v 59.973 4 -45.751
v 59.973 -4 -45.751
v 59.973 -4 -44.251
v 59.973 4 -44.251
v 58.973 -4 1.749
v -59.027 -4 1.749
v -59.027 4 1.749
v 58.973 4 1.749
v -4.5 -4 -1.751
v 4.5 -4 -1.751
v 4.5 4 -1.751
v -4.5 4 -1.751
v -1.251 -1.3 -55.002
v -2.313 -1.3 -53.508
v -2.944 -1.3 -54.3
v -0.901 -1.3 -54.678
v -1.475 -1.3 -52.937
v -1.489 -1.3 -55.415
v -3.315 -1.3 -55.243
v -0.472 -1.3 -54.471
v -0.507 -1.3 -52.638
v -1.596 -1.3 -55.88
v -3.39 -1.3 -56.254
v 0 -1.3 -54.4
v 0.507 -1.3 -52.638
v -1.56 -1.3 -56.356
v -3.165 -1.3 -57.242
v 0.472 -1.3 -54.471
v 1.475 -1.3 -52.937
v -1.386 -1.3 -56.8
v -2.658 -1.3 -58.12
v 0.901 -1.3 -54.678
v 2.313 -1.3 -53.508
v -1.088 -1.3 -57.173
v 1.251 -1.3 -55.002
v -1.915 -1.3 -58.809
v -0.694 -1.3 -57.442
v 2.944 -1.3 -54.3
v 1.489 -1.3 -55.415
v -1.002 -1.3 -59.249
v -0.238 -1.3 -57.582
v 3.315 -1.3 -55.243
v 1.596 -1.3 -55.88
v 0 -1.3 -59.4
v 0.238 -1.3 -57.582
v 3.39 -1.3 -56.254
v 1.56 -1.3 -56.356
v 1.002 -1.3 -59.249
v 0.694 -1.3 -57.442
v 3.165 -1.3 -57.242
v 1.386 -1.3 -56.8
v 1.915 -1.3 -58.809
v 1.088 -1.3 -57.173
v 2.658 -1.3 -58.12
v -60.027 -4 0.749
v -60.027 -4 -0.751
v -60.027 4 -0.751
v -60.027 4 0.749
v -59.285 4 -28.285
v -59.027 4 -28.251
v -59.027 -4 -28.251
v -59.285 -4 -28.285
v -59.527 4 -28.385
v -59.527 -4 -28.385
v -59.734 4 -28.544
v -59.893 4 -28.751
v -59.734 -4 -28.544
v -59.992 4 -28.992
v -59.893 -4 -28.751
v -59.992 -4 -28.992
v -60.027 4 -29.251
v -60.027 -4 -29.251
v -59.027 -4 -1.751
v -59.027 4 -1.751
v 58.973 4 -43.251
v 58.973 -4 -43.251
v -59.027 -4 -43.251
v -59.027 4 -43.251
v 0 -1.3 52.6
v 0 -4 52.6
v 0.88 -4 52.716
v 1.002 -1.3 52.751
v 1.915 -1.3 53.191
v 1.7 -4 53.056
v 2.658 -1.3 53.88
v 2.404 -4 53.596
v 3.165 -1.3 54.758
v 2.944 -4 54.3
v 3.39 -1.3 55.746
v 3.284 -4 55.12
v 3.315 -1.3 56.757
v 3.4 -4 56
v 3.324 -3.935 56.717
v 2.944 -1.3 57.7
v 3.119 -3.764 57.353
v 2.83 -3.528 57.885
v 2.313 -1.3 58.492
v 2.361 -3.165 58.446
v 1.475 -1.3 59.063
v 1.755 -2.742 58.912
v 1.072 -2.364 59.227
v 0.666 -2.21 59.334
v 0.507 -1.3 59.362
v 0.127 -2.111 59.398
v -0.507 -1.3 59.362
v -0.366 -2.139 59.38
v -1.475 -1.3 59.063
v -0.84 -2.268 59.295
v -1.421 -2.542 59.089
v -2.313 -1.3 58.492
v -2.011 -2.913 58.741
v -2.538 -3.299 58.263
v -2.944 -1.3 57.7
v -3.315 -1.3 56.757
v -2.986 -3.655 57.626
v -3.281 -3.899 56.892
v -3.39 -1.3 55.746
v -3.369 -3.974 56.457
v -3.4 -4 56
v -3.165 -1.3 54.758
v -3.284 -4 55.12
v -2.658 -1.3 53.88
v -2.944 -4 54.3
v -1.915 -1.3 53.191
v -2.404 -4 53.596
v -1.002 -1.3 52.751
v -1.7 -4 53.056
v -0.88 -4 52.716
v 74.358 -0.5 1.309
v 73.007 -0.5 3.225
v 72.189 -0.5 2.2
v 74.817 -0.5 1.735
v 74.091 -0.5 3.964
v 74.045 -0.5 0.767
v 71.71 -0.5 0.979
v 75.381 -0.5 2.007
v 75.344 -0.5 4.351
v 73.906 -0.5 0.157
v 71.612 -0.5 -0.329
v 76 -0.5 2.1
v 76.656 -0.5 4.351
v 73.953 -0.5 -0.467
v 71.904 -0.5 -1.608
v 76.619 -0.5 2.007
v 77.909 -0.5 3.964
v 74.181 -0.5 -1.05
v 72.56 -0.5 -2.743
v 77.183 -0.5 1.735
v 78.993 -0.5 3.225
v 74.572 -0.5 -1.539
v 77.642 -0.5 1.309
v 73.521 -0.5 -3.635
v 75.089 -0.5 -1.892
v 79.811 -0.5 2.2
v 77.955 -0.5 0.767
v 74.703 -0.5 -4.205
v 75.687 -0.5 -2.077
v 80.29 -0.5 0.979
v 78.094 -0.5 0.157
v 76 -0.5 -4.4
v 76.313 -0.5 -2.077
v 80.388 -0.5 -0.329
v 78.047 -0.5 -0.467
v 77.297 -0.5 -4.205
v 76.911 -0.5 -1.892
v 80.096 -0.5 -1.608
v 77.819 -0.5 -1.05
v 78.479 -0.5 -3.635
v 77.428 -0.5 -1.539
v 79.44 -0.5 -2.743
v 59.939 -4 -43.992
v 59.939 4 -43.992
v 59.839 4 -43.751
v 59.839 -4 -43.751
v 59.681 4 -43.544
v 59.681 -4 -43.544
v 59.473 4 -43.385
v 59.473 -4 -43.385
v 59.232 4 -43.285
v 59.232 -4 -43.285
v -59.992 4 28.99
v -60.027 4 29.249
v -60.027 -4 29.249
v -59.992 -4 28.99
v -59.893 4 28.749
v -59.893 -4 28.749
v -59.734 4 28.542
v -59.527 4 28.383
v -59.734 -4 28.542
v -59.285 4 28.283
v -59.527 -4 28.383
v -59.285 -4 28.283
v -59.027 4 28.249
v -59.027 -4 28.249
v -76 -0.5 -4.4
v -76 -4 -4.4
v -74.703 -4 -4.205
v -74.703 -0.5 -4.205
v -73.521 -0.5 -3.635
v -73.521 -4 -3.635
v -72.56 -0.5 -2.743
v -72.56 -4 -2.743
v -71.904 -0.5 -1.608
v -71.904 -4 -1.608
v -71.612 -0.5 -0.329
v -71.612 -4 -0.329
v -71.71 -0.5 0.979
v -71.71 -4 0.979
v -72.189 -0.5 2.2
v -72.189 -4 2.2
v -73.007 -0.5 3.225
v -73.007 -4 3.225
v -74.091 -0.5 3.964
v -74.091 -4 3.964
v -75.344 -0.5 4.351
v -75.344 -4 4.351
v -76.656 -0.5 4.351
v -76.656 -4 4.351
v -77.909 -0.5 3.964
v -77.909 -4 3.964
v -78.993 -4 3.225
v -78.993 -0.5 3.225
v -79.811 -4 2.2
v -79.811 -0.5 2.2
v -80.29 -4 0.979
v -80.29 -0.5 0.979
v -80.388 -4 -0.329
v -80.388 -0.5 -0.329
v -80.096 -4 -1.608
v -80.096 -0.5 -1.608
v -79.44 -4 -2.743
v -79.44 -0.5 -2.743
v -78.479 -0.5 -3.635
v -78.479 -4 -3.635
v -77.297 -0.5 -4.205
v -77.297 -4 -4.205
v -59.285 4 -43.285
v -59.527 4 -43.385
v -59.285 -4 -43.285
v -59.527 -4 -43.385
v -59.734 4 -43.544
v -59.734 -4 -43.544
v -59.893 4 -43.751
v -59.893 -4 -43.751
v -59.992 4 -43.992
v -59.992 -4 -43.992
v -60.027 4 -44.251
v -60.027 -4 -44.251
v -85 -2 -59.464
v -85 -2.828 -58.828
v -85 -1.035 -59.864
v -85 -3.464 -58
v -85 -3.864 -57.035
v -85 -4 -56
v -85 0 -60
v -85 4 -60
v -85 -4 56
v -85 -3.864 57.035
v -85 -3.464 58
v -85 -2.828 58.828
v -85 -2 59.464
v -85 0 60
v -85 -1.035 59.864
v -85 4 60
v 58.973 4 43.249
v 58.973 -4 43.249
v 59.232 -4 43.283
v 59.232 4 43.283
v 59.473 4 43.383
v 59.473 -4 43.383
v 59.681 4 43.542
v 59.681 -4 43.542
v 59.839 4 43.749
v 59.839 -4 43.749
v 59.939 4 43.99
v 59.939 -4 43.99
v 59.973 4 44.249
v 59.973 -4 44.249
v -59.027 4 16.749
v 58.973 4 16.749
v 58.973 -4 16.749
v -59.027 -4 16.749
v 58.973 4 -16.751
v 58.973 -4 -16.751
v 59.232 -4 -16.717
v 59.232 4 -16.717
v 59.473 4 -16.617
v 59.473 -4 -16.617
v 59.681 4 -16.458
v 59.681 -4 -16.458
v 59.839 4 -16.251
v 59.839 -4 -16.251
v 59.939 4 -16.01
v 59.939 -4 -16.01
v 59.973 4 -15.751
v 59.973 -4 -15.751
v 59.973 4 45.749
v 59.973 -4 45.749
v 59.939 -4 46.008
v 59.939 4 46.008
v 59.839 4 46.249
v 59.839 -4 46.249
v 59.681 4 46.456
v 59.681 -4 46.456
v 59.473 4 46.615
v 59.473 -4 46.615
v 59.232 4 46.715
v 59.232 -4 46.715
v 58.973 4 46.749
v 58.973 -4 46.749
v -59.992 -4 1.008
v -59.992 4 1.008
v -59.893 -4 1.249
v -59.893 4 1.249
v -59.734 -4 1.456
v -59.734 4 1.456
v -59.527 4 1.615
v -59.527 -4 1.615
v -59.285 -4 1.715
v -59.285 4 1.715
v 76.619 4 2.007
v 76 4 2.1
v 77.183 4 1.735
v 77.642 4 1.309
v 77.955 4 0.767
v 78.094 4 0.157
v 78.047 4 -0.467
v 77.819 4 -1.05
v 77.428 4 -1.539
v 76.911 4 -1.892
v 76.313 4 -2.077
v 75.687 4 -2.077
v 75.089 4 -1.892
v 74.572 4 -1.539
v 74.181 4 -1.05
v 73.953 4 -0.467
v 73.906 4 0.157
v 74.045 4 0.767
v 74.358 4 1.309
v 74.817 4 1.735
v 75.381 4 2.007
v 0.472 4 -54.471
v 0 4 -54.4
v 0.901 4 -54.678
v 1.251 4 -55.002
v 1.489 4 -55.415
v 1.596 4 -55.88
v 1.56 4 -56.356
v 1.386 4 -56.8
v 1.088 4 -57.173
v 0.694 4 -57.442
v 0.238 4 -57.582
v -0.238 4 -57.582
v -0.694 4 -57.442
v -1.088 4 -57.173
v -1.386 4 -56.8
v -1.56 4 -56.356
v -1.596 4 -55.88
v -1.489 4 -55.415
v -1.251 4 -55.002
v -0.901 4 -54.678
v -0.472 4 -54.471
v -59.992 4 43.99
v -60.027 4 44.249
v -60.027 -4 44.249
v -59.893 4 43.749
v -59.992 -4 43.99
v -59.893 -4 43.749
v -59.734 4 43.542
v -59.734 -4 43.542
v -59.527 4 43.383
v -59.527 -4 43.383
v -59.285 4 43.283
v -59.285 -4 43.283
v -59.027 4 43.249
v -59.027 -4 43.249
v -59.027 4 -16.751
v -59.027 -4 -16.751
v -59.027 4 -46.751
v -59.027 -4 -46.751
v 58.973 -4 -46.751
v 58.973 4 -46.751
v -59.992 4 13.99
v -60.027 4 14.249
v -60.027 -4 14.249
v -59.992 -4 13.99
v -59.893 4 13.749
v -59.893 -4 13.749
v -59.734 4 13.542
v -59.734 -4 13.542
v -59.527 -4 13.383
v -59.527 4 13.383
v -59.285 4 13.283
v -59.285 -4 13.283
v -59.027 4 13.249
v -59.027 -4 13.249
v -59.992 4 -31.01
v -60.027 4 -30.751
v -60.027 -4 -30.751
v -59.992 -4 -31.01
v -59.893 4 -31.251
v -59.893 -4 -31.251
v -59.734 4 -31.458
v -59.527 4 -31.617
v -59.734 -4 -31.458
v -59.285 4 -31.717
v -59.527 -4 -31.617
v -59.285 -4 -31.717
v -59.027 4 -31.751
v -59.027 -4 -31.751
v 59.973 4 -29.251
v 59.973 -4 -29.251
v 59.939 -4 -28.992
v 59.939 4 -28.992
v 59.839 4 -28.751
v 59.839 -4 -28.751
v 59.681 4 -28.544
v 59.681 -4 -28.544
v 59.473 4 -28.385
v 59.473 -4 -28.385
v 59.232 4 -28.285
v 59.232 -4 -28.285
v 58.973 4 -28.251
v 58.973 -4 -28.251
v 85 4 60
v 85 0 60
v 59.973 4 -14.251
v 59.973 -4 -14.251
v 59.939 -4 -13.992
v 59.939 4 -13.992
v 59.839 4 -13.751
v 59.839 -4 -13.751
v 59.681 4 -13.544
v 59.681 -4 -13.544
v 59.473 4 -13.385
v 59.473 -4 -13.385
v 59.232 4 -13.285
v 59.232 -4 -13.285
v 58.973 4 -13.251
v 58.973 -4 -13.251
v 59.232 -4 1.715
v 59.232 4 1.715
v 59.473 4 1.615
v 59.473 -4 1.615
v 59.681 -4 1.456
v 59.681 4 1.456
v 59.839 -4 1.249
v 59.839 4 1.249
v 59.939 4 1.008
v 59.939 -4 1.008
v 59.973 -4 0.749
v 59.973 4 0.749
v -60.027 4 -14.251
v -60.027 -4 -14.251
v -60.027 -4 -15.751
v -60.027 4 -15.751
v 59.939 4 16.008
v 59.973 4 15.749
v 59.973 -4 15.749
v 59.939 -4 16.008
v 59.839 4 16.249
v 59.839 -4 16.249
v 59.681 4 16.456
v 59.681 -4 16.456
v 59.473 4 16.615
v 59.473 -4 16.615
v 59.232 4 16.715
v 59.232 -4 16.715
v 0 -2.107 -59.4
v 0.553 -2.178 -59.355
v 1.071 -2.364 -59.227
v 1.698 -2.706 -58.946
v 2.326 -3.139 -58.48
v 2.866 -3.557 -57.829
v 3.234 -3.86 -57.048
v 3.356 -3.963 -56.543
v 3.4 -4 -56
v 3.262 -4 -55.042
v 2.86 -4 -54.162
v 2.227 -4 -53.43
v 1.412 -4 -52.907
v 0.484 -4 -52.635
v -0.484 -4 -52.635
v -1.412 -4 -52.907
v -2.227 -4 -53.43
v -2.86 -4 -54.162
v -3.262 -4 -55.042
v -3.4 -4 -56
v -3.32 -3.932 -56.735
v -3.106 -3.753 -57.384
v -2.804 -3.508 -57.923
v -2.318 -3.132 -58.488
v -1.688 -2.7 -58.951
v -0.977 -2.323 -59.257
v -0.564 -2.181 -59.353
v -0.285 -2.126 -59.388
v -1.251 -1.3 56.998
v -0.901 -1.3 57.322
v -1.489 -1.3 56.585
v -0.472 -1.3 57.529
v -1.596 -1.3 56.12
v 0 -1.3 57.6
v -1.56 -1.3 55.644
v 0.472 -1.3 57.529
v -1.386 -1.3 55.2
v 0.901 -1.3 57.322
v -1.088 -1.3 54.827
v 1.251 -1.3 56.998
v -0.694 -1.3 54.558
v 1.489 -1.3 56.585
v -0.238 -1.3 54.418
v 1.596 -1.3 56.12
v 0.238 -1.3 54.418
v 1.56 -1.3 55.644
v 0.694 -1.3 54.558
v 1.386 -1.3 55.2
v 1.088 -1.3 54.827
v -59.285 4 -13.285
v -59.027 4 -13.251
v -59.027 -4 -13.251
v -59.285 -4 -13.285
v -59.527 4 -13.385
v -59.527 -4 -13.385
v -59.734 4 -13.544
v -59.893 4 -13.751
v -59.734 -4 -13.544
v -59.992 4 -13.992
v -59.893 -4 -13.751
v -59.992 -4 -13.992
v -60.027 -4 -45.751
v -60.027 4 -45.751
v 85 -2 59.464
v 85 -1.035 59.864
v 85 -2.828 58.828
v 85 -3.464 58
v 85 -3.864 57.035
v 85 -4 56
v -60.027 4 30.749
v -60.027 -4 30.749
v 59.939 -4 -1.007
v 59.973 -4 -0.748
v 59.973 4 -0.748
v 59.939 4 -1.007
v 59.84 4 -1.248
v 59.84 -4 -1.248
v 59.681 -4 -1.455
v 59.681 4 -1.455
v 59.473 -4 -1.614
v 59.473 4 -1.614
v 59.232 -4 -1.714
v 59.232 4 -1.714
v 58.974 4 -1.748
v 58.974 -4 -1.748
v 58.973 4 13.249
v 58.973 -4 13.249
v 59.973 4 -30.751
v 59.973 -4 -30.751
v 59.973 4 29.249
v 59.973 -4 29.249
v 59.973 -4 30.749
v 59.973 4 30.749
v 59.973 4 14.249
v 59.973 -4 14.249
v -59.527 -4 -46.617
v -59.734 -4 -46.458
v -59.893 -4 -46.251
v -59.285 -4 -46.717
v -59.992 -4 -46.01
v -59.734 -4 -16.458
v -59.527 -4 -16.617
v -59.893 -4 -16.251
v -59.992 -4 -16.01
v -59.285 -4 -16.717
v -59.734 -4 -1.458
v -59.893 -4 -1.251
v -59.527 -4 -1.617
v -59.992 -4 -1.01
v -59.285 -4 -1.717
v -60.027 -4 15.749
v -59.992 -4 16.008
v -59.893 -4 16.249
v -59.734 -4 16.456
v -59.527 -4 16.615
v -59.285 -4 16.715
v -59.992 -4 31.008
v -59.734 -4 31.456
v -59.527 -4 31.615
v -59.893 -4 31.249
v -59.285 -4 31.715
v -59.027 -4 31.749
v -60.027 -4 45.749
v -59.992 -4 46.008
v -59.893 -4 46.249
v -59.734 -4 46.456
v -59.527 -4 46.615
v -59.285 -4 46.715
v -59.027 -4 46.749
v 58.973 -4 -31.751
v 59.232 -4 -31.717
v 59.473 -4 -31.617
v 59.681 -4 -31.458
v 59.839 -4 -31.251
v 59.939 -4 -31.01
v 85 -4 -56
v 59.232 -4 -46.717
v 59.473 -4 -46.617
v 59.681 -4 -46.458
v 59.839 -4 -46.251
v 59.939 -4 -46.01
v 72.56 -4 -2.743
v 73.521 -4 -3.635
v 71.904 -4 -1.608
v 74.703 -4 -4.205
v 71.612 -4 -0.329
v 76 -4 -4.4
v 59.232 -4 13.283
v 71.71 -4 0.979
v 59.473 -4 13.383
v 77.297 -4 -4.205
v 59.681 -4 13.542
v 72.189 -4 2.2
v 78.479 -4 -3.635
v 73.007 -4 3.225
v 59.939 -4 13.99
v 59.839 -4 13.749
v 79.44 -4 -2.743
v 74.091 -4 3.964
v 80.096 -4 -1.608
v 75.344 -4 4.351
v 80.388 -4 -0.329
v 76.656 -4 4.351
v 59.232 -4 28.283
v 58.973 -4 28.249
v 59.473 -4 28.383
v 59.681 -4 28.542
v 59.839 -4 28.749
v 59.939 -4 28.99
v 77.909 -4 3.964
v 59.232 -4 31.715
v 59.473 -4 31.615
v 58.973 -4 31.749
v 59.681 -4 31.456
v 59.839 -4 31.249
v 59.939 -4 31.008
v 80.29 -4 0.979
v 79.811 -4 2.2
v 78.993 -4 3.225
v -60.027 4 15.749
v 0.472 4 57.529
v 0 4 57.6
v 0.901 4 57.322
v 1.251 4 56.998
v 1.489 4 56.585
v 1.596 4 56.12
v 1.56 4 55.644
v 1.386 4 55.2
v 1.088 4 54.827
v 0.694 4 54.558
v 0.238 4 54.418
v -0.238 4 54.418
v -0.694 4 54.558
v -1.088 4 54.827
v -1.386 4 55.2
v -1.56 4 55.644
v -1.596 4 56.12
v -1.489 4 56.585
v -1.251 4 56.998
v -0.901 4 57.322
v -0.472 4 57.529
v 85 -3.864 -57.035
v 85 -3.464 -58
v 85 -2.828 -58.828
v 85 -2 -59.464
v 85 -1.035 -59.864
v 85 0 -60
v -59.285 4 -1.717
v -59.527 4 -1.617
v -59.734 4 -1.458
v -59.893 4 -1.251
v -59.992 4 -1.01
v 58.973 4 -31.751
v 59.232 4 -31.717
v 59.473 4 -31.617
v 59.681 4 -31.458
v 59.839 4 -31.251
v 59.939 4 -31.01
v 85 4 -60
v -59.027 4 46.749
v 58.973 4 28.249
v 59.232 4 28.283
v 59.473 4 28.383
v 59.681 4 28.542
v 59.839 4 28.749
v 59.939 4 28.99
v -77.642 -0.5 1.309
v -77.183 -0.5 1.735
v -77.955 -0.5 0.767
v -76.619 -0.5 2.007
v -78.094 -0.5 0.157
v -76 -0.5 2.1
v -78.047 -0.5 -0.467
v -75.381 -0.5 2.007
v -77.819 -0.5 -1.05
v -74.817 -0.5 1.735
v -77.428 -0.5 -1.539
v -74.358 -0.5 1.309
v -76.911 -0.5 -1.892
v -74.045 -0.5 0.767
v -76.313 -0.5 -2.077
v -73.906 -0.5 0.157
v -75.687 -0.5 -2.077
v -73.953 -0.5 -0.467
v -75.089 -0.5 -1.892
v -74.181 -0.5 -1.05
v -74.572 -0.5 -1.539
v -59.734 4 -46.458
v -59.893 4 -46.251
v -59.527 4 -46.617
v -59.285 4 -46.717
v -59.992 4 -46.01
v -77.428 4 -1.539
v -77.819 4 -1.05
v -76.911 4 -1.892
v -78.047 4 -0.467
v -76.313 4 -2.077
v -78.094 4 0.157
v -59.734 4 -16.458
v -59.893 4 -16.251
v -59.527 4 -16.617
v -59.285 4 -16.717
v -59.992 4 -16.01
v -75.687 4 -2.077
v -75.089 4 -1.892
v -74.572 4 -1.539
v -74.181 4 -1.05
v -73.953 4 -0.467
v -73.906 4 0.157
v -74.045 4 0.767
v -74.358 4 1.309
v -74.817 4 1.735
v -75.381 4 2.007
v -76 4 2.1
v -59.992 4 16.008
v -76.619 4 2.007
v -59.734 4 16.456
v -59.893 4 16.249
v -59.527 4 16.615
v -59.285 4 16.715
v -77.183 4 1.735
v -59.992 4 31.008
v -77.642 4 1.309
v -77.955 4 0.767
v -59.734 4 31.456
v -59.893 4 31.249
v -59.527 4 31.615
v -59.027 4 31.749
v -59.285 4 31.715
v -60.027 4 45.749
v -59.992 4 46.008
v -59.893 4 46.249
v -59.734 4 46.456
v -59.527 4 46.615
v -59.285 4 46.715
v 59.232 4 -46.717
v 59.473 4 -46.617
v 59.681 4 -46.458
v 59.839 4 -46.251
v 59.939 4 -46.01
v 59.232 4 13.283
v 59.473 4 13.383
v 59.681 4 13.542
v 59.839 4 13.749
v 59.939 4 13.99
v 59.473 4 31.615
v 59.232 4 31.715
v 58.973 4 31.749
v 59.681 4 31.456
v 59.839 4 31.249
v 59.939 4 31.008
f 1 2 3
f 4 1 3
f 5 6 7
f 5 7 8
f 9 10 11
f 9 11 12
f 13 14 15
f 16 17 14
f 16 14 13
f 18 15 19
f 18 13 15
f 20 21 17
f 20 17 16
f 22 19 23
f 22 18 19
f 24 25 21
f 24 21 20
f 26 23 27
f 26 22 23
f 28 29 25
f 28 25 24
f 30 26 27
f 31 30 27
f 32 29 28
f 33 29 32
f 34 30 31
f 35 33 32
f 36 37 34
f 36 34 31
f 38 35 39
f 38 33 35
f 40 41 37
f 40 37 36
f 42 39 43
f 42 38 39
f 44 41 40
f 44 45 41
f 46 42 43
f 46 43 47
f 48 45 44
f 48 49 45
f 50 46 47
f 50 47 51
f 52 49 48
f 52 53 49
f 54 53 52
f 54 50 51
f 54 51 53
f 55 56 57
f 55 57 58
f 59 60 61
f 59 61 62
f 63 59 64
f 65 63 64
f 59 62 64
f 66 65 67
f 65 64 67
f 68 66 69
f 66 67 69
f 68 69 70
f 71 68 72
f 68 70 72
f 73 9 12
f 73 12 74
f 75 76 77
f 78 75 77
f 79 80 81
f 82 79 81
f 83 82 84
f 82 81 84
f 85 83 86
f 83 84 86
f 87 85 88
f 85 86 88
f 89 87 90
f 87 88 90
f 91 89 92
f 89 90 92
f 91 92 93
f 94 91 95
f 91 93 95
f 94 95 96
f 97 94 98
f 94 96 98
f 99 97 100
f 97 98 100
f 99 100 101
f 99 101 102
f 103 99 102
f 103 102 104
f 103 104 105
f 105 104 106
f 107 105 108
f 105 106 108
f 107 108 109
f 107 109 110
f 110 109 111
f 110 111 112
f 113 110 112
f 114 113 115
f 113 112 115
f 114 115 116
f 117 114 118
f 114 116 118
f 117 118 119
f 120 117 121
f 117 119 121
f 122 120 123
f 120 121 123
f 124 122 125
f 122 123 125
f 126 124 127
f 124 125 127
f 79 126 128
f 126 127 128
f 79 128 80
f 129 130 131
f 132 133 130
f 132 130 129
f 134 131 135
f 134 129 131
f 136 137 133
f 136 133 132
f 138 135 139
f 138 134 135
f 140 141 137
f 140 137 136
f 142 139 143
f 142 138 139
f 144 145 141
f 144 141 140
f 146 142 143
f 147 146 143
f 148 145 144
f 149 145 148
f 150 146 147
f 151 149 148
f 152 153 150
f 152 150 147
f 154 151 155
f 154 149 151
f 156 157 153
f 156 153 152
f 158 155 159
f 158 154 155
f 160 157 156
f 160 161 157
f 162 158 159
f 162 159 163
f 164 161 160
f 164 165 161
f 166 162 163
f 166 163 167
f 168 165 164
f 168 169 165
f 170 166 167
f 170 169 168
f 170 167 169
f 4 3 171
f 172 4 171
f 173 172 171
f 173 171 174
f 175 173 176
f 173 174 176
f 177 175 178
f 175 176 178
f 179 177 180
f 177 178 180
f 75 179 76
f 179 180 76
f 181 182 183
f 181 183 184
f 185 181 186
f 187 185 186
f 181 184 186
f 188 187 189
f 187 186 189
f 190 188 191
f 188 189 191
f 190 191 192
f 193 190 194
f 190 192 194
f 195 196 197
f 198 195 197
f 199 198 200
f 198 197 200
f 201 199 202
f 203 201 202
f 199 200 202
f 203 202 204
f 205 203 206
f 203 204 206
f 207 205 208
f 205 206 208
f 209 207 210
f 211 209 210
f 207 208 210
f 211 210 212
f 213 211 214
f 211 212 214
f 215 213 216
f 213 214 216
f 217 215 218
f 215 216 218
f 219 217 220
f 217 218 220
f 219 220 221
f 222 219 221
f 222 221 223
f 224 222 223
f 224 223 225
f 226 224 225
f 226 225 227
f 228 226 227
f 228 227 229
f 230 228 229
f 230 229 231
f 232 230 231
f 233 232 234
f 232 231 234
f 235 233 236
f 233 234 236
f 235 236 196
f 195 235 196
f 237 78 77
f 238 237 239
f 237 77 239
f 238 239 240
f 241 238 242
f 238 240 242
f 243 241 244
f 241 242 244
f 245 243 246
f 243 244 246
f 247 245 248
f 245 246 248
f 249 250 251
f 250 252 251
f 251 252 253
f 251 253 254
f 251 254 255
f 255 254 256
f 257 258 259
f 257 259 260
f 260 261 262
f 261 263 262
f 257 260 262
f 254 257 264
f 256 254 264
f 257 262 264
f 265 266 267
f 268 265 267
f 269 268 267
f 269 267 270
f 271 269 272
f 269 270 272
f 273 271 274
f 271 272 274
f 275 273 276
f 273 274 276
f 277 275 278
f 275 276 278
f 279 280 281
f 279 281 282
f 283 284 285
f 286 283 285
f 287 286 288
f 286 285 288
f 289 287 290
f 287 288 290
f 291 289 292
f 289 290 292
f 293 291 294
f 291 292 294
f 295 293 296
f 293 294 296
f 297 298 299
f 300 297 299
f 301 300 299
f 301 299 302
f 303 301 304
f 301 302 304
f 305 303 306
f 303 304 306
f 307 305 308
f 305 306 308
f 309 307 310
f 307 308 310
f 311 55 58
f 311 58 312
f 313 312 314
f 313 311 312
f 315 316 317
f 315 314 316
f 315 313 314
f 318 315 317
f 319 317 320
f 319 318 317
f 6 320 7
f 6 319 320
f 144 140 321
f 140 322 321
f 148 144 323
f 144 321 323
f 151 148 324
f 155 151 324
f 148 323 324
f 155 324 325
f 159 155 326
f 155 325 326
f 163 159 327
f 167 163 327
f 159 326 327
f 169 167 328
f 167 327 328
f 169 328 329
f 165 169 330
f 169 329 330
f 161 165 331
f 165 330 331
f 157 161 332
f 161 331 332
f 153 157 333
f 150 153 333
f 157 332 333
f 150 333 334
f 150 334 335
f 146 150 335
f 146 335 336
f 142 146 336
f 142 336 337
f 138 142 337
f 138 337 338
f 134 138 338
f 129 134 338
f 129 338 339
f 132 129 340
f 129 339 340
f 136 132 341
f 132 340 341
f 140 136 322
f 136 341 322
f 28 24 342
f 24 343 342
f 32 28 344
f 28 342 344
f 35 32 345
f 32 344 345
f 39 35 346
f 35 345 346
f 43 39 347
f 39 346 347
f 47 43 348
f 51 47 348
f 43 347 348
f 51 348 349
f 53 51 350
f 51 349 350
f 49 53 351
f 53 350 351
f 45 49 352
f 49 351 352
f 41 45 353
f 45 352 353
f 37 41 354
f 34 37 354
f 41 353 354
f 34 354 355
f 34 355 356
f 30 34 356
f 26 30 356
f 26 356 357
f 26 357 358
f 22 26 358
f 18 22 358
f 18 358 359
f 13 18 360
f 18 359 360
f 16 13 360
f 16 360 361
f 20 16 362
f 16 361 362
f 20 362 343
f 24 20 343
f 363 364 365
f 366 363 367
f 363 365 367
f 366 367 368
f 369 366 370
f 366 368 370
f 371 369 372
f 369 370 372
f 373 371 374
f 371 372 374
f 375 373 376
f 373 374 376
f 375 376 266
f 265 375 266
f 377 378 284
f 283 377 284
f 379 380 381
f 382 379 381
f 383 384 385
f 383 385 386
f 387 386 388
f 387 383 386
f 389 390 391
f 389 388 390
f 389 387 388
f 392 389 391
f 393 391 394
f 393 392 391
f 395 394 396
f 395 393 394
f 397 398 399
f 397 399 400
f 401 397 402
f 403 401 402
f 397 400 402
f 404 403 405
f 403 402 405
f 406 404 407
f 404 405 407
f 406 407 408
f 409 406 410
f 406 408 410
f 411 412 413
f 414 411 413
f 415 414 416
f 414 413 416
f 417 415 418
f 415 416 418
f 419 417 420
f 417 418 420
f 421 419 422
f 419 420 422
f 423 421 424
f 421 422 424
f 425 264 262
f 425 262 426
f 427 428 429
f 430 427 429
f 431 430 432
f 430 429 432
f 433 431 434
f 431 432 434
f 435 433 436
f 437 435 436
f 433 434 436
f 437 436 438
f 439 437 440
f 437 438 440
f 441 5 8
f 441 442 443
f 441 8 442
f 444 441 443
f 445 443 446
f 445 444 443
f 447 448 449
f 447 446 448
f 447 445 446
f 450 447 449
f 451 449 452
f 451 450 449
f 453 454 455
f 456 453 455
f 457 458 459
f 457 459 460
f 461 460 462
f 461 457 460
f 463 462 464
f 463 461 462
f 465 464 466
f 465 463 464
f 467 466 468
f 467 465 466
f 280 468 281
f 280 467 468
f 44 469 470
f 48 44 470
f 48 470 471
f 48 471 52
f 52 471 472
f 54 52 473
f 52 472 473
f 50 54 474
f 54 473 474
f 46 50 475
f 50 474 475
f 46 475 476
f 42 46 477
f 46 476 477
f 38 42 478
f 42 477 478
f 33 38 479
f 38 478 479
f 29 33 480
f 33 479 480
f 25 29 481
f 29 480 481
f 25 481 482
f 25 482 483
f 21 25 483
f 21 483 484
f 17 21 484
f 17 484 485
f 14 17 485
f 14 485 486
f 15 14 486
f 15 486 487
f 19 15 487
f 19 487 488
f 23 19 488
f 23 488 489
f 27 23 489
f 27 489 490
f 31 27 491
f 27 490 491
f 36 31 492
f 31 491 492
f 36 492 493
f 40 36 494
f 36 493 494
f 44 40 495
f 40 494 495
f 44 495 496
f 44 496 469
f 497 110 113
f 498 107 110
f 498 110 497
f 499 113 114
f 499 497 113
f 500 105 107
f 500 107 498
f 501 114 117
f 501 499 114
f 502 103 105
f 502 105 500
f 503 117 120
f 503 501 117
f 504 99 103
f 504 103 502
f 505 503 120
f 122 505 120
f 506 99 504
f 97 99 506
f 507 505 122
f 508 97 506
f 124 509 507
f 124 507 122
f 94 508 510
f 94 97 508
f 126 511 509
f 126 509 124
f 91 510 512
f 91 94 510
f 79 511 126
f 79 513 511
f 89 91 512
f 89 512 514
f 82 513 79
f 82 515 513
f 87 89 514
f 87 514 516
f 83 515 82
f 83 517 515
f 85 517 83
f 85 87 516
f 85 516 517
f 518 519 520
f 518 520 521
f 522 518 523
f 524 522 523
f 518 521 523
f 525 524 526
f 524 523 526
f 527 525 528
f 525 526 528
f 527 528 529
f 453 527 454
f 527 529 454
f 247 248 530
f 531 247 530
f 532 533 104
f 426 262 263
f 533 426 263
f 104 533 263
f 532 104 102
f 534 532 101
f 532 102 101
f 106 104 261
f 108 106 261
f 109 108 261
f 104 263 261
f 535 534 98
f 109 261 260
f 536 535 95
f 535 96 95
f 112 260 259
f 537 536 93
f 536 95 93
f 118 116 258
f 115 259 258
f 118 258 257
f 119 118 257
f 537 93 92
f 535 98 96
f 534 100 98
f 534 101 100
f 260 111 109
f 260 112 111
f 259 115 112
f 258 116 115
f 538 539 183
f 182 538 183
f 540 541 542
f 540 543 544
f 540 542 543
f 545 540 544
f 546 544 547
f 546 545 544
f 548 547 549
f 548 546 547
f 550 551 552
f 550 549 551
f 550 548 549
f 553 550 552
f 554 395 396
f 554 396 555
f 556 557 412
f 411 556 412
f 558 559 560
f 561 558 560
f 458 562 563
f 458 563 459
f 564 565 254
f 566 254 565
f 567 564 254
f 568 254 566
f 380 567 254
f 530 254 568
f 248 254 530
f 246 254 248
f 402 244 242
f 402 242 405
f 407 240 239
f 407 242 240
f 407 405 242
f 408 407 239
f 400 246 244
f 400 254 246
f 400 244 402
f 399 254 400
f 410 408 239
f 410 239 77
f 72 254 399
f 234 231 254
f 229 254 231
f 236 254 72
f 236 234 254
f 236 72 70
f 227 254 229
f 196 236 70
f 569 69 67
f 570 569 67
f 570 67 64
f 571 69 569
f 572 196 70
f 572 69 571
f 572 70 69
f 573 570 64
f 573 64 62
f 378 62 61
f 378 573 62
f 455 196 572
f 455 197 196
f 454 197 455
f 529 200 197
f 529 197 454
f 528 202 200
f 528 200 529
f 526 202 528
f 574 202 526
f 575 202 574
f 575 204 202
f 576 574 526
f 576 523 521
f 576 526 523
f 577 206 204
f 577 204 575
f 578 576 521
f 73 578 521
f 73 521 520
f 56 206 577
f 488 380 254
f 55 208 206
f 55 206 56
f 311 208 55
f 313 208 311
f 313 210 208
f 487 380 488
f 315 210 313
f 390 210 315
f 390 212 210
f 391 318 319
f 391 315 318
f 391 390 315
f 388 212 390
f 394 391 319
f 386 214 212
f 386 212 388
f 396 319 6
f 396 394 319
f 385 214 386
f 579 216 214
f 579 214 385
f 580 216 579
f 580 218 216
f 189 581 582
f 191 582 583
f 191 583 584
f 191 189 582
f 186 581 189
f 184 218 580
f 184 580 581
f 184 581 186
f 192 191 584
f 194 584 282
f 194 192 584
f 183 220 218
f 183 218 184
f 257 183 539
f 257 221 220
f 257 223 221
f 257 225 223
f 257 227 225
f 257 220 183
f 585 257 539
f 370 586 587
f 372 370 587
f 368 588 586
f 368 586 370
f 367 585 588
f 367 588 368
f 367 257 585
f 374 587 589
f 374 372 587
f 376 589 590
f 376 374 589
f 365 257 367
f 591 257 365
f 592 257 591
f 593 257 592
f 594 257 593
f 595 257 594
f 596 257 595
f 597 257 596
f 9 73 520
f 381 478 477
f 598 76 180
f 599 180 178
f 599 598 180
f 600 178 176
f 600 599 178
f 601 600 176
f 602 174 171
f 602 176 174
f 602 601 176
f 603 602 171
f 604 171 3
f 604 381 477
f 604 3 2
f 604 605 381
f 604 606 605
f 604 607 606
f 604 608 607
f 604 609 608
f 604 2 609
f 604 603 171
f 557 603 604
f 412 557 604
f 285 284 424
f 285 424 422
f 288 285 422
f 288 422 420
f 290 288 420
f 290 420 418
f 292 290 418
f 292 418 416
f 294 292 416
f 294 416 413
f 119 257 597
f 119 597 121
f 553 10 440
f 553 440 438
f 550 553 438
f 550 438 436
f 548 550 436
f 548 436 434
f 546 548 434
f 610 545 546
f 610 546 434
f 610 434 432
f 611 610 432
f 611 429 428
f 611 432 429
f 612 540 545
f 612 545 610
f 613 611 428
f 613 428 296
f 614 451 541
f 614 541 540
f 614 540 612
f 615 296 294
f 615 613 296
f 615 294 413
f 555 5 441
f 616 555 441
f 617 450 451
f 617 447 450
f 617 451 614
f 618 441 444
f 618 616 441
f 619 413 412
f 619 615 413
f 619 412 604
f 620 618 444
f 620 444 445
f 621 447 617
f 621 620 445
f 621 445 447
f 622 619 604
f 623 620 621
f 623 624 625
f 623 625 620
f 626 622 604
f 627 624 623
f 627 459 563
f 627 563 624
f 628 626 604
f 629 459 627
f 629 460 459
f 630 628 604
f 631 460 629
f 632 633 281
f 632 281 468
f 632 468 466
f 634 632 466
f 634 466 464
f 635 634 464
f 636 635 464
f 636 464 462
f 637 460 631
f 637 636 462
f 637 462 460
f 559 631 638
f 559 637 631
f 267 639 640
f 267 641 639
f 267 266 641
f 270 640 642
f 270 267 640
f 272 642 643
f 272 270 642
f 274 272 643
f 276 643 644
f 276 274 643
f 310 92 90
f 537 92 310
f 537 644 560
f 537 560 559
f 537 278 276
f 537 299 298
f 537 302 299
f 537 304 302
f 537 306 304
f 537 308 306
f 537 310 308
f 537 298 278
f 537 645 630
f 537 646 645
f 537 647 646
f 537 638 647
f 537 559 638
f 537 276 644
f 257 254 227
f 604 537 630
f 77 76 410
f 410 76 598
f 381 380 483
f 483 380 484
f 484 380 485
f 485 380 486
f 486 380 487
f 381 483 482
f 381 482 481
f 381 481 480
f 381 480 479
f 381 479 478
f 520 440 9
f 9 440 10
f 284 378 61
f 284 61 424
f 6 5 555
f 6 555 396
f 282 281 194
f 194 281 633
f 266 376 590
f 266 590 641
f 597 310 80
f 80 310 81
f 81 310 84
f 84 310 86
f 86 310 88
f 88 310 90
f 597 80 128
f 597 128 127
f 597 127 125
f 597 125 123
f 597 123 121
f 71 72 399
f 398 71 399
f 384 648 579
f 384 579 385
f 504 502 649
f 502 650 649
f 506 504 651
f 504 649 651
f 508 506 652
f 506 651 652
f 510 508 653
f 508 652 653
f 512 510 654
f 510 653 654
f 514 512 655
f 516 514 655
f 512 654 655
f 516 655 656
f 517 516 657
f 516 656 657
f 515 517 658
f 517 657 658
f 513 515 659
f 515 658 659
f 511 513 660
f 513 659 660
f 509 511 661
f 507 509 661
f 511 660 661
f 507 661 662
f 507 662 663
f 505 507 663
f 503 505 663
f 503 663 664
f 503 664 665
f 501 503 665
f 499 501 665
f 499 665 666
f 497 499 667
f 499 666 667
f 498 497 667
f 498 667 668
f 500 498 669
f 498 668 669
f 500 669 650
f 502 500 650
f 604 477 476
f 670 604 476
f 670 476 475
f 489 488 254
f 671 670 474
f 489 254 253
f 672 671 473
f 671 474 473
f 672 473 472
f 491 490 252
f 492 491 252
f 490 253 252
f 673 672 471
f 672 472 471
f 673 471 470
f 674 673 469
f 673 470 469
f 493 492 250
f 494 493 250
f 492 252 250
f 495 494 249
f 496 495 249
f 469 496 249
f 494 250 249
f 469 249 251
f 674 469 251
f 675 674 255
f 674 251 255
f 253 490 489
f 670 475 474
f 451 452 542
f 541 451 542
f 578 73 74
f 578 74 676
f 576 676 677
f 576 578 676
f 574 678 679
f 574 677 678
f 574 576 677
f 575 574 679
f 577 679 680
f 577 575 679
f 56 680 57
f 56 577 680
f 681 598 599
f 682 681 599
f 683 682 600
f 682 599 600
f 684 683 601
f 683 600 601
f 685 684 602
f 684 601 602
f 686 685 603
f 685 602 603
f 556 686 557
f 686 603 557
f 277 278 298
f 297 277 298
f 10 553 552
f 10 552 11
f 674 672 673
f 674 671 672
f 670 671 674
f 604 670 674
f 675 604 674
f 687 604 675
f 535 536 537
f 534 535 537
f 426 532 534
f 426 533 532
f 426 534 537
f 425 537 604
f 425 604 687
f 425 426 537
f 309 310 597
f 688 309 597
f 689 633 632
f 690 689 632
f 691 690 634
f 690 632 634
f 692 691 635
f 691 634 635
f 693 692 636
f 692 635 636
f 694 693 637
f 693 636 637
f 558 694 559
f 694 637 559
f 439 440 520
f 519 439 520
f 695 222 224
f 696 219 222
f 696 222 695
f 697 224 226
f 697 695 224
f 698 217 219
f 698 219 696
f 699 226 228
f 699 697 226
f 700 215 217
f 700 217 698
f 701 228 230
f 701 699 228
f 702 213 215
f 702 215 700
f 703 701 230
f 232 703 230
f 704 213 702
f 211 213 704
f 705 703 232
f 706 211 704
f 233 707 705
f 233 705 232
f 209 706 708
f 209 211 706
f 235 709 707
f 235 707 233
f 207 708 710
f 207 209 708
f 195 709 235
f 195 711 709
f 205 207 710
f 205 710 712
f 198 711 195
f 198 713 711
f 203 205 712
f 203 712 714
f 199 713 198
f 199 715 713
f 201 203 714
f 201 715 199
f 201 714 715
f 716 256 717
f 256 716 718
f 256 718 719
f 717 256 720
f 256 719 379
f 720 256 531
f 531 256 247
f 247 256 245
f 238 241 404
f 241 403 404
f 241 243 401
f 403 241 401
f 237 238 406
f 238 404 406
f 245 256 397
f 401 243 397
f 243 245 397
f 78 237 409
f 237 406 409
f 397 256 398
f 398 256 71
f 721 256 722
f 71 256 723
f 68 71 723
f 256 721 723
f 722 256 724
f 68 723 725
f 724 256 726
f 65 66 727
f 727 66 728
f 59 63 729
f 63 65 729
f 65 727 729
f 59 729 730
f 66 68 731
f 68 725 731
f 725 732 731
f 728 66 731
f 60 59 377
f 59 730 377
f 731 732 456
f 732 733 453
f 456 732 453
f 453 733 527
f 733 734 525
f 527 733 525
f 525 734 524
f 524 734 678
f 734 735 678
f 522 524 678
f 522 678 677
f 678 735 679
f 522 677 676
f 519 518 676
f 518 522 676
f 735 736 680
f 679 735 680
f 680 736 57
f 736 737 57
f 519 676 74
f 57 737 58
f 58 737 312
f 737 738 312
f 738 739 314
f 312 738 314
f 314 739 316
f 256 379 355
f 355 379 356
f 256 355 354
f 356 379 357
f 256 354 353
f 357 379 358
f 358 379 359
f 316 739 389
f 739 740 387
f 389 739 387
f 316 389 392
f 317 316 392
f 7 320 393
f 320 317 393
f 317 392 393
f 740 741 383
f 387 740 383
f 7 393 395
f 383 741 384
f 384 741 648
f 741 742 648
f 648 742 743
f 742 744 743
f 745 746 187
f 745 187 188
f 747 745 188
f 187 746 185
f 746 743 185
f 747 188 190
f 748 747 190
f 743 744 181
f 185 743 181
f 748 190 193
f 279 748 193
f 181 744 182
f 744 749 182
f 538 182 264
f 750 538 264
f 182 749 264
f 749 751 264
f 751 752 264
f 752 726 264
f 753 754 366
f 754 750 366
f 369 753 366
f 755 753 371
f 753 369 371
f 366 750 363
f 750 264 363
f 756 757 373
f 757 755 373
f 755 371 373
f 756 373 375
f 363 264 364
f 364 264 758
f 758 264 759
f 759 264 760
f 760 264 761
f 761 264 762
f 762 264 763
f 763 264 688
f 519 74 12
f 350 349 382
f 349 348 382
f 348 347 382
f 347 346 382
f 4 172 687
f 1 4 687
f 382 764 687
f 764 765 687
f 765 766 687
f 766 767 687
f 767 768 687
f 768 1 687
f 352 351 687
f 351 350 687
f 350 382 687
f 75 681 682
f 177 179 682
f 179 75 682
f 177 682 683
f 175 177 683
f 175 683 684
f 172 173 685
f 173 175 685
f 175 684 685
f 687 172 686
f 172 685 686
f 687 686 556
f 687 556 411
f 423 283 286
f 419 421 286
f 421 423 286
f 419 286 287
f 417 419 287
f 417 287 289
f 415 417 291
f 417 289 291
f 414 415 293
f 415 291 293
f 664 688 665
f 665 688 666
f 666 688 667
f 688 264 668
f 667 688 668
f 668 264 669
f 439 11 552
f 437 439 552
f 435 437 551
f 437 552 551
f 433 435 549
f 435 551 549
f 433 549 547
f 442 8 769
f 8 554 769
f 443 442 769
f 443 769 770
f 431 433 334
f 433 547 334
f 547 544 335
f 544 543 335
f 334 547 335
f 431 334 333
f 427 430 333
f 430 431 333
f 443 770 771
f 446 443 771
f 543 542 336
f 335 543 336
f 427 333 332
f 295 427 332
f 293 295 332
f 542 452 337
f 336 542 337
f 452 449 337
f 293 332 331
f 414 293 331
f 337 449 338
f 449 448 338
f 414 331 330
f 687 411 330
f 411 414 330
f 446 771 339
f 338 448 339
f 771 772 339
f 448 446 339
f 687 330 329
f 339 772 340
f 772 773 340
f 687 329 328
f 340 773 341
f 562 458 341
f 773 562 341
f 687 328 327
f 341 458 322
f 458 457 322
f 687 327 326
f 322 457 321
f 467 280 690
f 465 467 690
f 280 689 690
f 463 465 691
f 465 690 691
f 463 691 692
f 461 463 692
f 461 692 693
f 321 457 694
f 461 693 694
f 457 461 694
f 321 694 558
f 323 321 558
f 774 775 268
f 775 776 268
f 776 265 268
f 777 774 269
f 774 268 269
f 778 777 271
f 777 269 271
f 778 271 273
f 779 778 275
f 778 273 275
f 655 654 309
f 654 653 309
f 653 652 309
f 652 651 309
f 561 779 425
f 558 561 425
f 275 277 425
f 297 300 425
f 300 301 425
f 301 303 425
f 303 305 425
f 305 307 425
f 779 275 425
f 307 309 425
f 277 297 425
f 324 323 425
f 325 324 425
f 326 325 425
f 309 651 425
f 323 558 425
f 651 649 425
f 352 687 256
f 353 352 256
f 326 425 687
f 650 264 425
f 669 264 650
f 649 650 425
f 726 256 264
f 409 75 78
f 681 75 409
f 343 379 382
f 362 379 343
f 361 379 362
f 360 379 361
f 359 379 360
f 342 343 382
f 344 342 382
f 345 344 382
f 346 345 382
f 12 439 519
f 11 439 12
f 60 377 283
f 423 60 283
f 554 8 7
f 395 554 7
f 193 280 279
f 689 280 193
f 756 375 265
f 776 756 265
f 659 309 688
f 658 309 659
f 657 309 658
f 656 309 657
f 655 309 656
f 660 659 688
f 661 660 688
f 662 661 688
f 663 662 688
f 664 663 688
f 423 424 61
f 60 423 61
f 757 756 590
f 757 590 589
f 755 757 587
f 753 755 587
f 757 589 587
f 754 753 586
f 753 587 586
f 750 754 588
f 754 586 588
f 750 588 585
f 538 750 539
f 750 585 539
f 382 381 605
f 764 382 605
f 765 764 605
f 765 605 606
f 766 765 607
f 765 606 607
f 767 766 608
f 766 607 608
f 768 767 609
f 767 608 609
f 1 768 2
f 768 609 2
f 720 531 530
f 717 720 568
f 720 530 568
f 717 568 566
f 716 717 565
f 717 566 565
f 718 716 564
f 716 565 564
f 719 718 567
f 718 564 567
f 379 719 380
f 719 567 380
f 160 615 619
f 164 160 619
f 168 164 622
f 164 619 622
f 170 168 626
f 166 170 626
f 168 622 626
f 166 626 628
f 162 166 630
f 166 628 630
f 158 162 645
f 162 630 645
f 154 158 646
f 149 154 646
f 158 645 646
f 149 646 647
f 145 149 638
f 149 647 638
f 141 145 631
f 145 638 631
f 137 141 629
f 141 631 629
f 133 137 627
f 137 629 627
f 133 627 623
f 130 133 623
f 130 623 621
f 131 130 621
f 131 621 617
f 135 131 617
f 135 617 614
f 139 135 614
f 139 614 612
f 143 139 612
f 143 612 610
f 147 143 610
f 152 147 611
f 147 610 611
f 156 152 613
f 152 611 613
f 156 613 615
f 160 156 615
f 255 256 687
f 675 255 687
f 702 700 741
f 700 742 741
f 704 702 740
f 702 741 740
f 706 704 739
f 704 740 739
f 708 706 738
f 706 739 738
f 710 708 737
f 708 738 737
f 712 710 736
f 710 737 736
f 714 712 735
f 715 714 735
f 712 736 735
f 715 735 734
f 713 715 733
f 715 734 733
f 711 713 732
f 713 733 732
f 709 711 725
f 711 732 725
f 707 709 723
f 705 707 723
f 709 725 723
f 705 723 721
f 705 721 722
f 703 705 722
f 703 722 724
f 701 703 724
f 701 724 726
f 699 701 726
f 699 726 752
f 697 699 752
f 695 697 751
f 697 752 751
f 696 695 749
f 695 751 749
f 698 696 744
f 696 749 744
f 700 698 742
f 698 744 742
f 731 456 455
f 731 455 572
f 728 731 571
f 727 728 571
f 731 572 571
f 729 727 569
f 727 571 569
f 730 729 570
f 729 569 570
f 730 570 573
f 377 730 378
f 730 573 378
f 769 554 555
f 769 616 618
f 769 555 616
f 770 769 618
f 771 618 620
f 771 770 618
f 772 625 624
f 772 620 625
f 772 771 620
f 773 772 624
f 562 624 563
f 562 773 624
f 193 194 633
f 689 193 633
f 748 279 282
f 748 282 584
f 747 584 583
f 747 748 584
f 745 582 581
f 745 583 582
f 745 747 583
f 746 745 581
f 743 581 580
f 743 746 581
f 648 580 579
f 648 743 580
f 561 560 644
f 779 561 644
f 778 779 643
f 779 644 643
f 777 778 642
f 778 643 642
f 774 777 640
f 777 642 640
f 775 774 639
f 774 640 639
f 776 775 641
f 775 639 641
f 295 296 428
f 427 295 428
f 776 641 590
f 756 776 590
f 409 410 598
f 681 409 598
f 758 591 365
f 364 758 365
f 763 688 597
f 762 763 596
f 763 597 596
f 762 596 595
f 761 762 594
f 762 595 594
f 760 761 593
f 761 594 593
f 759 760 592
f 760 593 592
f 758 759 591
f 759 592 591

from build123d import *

# Parameters (mm, degrees)
IZIM1_W                     = 170
IZIM1_H                     = 8
Y_KSEKLIK_EKSTR_ZYON1_DEPTH = 60
IZIM2_R                     = 1.6
IZIM2_R_2                   = 2.1
KES_EKSTR_ZYON1_DEPTH       = 5
IZIM3_R                     = 3.4
KES_EKSTR_ZYON2_DEPTH       = 2.7
IZIM4_R                     = 4.4
KES_EKSTR_ZYON3_DEPTH       = 3.5
RADYUS1_R                   = 4
KES_EKSTR_ZYON4_DEPTH       = 10


with BuildPart() as part:
    # Çizim1 → Yükseklik-Ekstrüzyon1 (new, symmetric)
    with BuildSketch(Plane.XY):
        Rectangle(IZIM1_W, IZIM1_H)
    extrude(amount=Y_KSEKLIK_EKSTR_ZYON1_DEPTH, both=True)

    # Çizim2 → Kes-Ekstrüzyon1 (cut, symmetric)
    with BuildSketch(Plane(origin=(0, 0, 0), x_dir=(1, 0, 0), z_dir=(0, 1, 0))):
        with Locations(Location((0, 56, 0), (0, 0, 270))):
            Circle(IZIM2_R)
        with Locations(Location((0, -56, 0), (0, 0, 270))):
            Circle(IZIM2_R)
        with Locations(Location((-76, 0, 0), (0, 0, 270))):
            Circle(IZIM2_R_2)
        with Locations(Location((76, 0, 0), (0, 0, 270))):
            Circle(IZIM2_R_2)
    extrude(amount=KES_EKSTR_ZYON1_DEPTH, both=True, mode=Mode.SUBTRACT)

    # Çizim3 → Kes-Ekstrüzyon2 (cut)
    with BuildSketch(Plane.XZ.offset(4)):
        with Locations(Location((0, -56, 0), (0, 0, 270))):
            Circle(IZIM3_R)
        with Locations(Location((0, 56, 0), (0, 0, 270))):
            Circle(IZIM3_R)
    extrude(amount=-KES_EKSTR_ZYON2_DEPTH, mode=Mode.SUBTRACT)

    # Çizim4 → Kes-Ekstrüzyon3 (cut)
    with BuildSketch(Plane.XZ.offset(4)):
        with Locations(Location((-76, 0, 0), (0, 0, 270))):
            Circle(IZIM4_R)
        with Locations(Location((76, 0, 0), (0, 0, 270))):
            Circle(IZIM4_R)
    extrude(amount=-KES_EKSTR_ZYON3_DEPTH, mode=Mode.SUBTRACT)

    # Radyus1
    # the kernel refuses this fillet: 4 mm, written as the material it takes off along each edge
    with BuildSketch(Plane(origin=(-95, -4, 60), x_dir=(0, 0, -1), z_dir=(1, 0, 0))) as radyus1_piece_1:
        with BuildLine():
            CenterArc((RADYUS1_R, RADYUS1_R), RADYUS1_R, 180, 90)
            Line((0, RADYUS1_R), (0, 0))
            Line((0, 0), (RADYUS1_R, 0))
        make_face()
    extrude(amount=190, mode=Mode.SUBTRACT)
    with BuildSketch(Plane(origin=(-95, -4, -60), x_dir=(0, 0, 1), z_dir=(1, 0, 0))) as radyus1_piece_2:
        with BuildLine():
            CenterArc((RADYUS1_R, -RADYUS1_R), RADYUS1_R, 90, 90)
            Line((0, -RADYUS1_R), (0, 0))
            Line((0, 0), (RADYUS1_R, 0))
        make_face()
    extrude(amount=190, mode=Mode.SUBTRACT)

    # Çizim6 → Kes-Ekstrüzyon4 (cut, symmetric)
    with BuildSketch(Plane(origin=(0, 0, 0), x_dir=(1, 0, 0), z_dir=(0, 1, 0))):
        with BuildLine():
            Line((4.5, -43.24922609), (58.973465944, -43.24922609))
            ThreePointArc((58.973465944, -43.24922609), (59.680572726, -43.542119309), (59.973465944, -44.24922609))
            Line((59.973465944, -44.24922609), (59.973465944, -45.74922609))
            ThreePointArc((59.973465944, -45.74922609), (59.680572726, -46.456332871), (58.973465944, -46.74922609))
            Line((58.973465944, -46.74922609), (-59.026534056, -46.74922609))
            ThreePointArc((-59.026534056, -46.74922609), (-59.733640837, -46.456332871), (-60.026534056, -45.74922609))
            Line((-60.026534056, -45.74922609), (-60.026534056, -44.24922609))
            ThreePointArc((-60.026534056, -44.24922609), (-59.733640837, -43.542119309), (-59.026534056, -43.24922609))
            Line((-59.026534056, -43.24922609), (-4.5, -43.24922609))
            Line((-4.5, -43.24922609), (4.5, -43.24922609))
        make_face()
        with BuildLine():
            Line((-59.026534056, -1.74922609), (-4.5, -1.74922609))
            Line((-4.5, -1.74922609), (4.5, -1.74922609))
            Line((4.5, -1.74922609), (58.973465944, -1.74922609))
            ThreePointArc((58.973465944, -1.74922609), (59.680572726, -1.456332871), (59.973465944, -0.74922609))
            Line((59.973465944, -0.74922609), (59.973465944, 0.747733475))
            ThreePointArc((59.973465944, 0.747733475), (59.68059176, 1.454821222), (58.973519783, 1.747733474))
            Line((58.973519783, 1.747733474), (4.499892323, 1.750666239))
            Line((4.499892323, 1.750666239), (-4.5, 1.75077391))
            Line((-4.5, 1.75077391), (-59.026534056, 1.75077391))
            ThreePointArc((-59.026534056, 1.75077391), (-59.733640837, 1.457880691), (-60.026534056, 0.75077391))
            Line((-60.026534056, 0.75077391), (-60.026534056, -0.74922609))
            ThreePointArc((-60.026534056, -0.74922609), (-59.733640837, -1.456332871), (-59.026534056, -1.74922609))
        make_face()
        with BuildLine():
            Line((4.5, -28.24922609), (58.973465944, -28.24922609))
            ThreePointArc((58.973465944, -28.24922609), (59.680572726, -28.542119309), (59.973465944, -29.24922609))
            Line((59.973465944, -29.24922609), (59.973465944, -30.74922609))
            ThreePointArc((59.973465944, -30.74922609), (59.680572726, -31.456332871), (58.973465944, -31.74922609))
            Line((58.973465944, -31.74922609), (4.5, -31.74922609))
            Line((4.5, -31.74922609), (-4.5, -31.74922609))
            Line((-4.5, -31.74922609), (-59.026534056, -31.74922609))
            ThreePointArc((-59.026534056, -31.74922609), (-59.733640837, -31.456332871), (-60.026534056, -30.74922609))
            Line((-60.026534056, -30.74922609), (-60.026534056, -29.24922609))
            ThreePointArc((-60.026534056, -29.24922609), (-59.733640837, -28.542119309), (-59.026534056, -28.24922609))
            Line((-59.026534056, -28.24922609), (-4.5, -28.24922609))
            Line((-4.5, -28.24922609), (4.5, -28.24922609))
        make_face()
        with BuildLine():
            Line((-60.026534056, 14.25077391), (-60.026534056, 15.75077391))
            ThreePointArc((-60.026534056, 15.75077391), (-59.733640837, 16.457880691), (-59.026534056, 16.75077391))
            Line((-59.026534056, 16.75077391), (-4.5, 16.75077391))
            Line((-4.5, 16.75077391), (4.5, 16.75077391))
            Line((4.5, 16.75077391), (58.973465944, 16.75077391))
            ThreePointArc((58.973465944, 16.75077391), (59.680572726, 16.457880691), (59.973465944, 15.75077391))
            Line((59.973465944, 15.75077391), (59.973465944, 14.25077391))
            ThreePointArc((59.973465944, 14.25077391), (59.680572726, 13.543667129), (58.973465944, 13.25077391))
            Line((58.973465944, 13.25077391), (4.5, 13.25077391))
            Line((4.5, 13.25077391), (-4.5, 13.25077391))
            Line((-4.5, 13.25077391), (-59.026534056, 13.25077391))
            ThreePointArc((-59.026534056, 13.25077391), (-59.733640837, 13.543667129), (-60.026534056, 14.25077391))
        make_face()
        with BuildLine():
            Line((-60.026534056, 29.25077391), (-60.026534056, 30.75077391))
            ThreePointArc((-60.026534056, 30.75077391), (-59.733640837, 31.457880691), (-59.026534056, 31.75077391))
            Line((-59.026534056, 31.75077391), (-4.5, 31.75077391))
            Line((-4.5, 31.75077391), (4.5, 31.75077391))
            Line((4.5, 31.75077391), (58.973465944, 31.75077391))
            ThreePointArc((58.973465944, 31.75077391), (59.680572726, 31.457880691), (59.973465944, 30.75077391))
            Line((59.973465944, 30.75077391), (59.973465944, 29.25077391))
            ThreePointArc((59.973465944, 29.25077391), (59.680572726, 28.543667129), (58.973465944, 28.25077391))
            Line((58.973465944, 28.25077391), (4.5, 28.25077391))
            Line((4.5, 28.25077391), (-4.5, 28.25077391))
            Line((-4.5, 28.25077391), (-59.026534056, 28.25077391))
            ThreePointArc((-59.026534056, 28.25077391), (-59.733640837, 28.543667129), (-60.026534056, 29.25077391))
        make_face()
        with BuildLine():
            Line((-60.026534056, 44.25077391), (-60.026534056, 45.75077391))
            ThreePointArc((-60.026534056, 45.75077391), (-59.733640837, 46.457880691), (-59.026534056, 46.75077391))
            Line((-59.026534056, 46.75077391), (58.973465944, 46.75077391))
            ThreePointArc((58.973465944, 46.75077391), (59.680572726, 46.457880691), (59.973465944, 45.75077391))
            Line((59.973465944, 45.75077391), (59.973465944, 44.25077391))
            ThreePointArc((59.973465944, 44.25077391), (59.680572726, 43.543667129), (58.973465944, 43.25077391))
            Line((58.973465944, 43.25077391), (4.5, 43.25077391))
            Line((4.5, 43.25077391), (-4.5, 43.25077391))
            Line((-4.5, 43.25077391), (-59.026534056, 43.25077391))
            ThreePointArc((-59.026534056, 43.25077391), (-59.733640837, 43.543667129), (-60.026534056, 44.25077391))
        make_face()
        with BuildLine():
            Line((-60.026534056, -15.74922609), (-60.026534056, -14.24922609))
            ThreePointArc((-60.026534056, -14.24922609), (-59.733640837, -13.542119309), (-59.026534056, -13.24922609))
            Line((-59.026534056, -13.24922609), (-4.5, -13.24922609))
            Line((-4.5, -13.24922609), (4.5, -13.24922609))
            Line((4.5, -13.24922609), (58.973465944, -13.24922609))
            ThreePointArc((58.973465944, -13.24922609), (59.680572726, -13.542119309), (59.973465944, -14.24922609))
            Line((59.973465944, -14.24922609), (59.973465944, -15.74922609))
            ThreePointArc((59.973465944, -15.74922609), (59.680572726, -16.456332871), (58.973465944, -16.74922609))
            Line((58.973465944, -16.74922609), (4.5, -16.74922609))
            Line((4.5, -16.74922609), (-4.5, -16.74922609))
            Line((-4.5, -16.74922609), (-59.026534056, -16.74922609))
            ThreePointArc((-59.026534056, -16.74922609), (-59.733640837, -16.456332871), (-60.026534056, -15.74922609))
        make_face()
    extrude(amount=KES_EKSTR_ZYON4_DEPTH, both=True, mode=Mode.SUBTRACT)


solid = part.part
